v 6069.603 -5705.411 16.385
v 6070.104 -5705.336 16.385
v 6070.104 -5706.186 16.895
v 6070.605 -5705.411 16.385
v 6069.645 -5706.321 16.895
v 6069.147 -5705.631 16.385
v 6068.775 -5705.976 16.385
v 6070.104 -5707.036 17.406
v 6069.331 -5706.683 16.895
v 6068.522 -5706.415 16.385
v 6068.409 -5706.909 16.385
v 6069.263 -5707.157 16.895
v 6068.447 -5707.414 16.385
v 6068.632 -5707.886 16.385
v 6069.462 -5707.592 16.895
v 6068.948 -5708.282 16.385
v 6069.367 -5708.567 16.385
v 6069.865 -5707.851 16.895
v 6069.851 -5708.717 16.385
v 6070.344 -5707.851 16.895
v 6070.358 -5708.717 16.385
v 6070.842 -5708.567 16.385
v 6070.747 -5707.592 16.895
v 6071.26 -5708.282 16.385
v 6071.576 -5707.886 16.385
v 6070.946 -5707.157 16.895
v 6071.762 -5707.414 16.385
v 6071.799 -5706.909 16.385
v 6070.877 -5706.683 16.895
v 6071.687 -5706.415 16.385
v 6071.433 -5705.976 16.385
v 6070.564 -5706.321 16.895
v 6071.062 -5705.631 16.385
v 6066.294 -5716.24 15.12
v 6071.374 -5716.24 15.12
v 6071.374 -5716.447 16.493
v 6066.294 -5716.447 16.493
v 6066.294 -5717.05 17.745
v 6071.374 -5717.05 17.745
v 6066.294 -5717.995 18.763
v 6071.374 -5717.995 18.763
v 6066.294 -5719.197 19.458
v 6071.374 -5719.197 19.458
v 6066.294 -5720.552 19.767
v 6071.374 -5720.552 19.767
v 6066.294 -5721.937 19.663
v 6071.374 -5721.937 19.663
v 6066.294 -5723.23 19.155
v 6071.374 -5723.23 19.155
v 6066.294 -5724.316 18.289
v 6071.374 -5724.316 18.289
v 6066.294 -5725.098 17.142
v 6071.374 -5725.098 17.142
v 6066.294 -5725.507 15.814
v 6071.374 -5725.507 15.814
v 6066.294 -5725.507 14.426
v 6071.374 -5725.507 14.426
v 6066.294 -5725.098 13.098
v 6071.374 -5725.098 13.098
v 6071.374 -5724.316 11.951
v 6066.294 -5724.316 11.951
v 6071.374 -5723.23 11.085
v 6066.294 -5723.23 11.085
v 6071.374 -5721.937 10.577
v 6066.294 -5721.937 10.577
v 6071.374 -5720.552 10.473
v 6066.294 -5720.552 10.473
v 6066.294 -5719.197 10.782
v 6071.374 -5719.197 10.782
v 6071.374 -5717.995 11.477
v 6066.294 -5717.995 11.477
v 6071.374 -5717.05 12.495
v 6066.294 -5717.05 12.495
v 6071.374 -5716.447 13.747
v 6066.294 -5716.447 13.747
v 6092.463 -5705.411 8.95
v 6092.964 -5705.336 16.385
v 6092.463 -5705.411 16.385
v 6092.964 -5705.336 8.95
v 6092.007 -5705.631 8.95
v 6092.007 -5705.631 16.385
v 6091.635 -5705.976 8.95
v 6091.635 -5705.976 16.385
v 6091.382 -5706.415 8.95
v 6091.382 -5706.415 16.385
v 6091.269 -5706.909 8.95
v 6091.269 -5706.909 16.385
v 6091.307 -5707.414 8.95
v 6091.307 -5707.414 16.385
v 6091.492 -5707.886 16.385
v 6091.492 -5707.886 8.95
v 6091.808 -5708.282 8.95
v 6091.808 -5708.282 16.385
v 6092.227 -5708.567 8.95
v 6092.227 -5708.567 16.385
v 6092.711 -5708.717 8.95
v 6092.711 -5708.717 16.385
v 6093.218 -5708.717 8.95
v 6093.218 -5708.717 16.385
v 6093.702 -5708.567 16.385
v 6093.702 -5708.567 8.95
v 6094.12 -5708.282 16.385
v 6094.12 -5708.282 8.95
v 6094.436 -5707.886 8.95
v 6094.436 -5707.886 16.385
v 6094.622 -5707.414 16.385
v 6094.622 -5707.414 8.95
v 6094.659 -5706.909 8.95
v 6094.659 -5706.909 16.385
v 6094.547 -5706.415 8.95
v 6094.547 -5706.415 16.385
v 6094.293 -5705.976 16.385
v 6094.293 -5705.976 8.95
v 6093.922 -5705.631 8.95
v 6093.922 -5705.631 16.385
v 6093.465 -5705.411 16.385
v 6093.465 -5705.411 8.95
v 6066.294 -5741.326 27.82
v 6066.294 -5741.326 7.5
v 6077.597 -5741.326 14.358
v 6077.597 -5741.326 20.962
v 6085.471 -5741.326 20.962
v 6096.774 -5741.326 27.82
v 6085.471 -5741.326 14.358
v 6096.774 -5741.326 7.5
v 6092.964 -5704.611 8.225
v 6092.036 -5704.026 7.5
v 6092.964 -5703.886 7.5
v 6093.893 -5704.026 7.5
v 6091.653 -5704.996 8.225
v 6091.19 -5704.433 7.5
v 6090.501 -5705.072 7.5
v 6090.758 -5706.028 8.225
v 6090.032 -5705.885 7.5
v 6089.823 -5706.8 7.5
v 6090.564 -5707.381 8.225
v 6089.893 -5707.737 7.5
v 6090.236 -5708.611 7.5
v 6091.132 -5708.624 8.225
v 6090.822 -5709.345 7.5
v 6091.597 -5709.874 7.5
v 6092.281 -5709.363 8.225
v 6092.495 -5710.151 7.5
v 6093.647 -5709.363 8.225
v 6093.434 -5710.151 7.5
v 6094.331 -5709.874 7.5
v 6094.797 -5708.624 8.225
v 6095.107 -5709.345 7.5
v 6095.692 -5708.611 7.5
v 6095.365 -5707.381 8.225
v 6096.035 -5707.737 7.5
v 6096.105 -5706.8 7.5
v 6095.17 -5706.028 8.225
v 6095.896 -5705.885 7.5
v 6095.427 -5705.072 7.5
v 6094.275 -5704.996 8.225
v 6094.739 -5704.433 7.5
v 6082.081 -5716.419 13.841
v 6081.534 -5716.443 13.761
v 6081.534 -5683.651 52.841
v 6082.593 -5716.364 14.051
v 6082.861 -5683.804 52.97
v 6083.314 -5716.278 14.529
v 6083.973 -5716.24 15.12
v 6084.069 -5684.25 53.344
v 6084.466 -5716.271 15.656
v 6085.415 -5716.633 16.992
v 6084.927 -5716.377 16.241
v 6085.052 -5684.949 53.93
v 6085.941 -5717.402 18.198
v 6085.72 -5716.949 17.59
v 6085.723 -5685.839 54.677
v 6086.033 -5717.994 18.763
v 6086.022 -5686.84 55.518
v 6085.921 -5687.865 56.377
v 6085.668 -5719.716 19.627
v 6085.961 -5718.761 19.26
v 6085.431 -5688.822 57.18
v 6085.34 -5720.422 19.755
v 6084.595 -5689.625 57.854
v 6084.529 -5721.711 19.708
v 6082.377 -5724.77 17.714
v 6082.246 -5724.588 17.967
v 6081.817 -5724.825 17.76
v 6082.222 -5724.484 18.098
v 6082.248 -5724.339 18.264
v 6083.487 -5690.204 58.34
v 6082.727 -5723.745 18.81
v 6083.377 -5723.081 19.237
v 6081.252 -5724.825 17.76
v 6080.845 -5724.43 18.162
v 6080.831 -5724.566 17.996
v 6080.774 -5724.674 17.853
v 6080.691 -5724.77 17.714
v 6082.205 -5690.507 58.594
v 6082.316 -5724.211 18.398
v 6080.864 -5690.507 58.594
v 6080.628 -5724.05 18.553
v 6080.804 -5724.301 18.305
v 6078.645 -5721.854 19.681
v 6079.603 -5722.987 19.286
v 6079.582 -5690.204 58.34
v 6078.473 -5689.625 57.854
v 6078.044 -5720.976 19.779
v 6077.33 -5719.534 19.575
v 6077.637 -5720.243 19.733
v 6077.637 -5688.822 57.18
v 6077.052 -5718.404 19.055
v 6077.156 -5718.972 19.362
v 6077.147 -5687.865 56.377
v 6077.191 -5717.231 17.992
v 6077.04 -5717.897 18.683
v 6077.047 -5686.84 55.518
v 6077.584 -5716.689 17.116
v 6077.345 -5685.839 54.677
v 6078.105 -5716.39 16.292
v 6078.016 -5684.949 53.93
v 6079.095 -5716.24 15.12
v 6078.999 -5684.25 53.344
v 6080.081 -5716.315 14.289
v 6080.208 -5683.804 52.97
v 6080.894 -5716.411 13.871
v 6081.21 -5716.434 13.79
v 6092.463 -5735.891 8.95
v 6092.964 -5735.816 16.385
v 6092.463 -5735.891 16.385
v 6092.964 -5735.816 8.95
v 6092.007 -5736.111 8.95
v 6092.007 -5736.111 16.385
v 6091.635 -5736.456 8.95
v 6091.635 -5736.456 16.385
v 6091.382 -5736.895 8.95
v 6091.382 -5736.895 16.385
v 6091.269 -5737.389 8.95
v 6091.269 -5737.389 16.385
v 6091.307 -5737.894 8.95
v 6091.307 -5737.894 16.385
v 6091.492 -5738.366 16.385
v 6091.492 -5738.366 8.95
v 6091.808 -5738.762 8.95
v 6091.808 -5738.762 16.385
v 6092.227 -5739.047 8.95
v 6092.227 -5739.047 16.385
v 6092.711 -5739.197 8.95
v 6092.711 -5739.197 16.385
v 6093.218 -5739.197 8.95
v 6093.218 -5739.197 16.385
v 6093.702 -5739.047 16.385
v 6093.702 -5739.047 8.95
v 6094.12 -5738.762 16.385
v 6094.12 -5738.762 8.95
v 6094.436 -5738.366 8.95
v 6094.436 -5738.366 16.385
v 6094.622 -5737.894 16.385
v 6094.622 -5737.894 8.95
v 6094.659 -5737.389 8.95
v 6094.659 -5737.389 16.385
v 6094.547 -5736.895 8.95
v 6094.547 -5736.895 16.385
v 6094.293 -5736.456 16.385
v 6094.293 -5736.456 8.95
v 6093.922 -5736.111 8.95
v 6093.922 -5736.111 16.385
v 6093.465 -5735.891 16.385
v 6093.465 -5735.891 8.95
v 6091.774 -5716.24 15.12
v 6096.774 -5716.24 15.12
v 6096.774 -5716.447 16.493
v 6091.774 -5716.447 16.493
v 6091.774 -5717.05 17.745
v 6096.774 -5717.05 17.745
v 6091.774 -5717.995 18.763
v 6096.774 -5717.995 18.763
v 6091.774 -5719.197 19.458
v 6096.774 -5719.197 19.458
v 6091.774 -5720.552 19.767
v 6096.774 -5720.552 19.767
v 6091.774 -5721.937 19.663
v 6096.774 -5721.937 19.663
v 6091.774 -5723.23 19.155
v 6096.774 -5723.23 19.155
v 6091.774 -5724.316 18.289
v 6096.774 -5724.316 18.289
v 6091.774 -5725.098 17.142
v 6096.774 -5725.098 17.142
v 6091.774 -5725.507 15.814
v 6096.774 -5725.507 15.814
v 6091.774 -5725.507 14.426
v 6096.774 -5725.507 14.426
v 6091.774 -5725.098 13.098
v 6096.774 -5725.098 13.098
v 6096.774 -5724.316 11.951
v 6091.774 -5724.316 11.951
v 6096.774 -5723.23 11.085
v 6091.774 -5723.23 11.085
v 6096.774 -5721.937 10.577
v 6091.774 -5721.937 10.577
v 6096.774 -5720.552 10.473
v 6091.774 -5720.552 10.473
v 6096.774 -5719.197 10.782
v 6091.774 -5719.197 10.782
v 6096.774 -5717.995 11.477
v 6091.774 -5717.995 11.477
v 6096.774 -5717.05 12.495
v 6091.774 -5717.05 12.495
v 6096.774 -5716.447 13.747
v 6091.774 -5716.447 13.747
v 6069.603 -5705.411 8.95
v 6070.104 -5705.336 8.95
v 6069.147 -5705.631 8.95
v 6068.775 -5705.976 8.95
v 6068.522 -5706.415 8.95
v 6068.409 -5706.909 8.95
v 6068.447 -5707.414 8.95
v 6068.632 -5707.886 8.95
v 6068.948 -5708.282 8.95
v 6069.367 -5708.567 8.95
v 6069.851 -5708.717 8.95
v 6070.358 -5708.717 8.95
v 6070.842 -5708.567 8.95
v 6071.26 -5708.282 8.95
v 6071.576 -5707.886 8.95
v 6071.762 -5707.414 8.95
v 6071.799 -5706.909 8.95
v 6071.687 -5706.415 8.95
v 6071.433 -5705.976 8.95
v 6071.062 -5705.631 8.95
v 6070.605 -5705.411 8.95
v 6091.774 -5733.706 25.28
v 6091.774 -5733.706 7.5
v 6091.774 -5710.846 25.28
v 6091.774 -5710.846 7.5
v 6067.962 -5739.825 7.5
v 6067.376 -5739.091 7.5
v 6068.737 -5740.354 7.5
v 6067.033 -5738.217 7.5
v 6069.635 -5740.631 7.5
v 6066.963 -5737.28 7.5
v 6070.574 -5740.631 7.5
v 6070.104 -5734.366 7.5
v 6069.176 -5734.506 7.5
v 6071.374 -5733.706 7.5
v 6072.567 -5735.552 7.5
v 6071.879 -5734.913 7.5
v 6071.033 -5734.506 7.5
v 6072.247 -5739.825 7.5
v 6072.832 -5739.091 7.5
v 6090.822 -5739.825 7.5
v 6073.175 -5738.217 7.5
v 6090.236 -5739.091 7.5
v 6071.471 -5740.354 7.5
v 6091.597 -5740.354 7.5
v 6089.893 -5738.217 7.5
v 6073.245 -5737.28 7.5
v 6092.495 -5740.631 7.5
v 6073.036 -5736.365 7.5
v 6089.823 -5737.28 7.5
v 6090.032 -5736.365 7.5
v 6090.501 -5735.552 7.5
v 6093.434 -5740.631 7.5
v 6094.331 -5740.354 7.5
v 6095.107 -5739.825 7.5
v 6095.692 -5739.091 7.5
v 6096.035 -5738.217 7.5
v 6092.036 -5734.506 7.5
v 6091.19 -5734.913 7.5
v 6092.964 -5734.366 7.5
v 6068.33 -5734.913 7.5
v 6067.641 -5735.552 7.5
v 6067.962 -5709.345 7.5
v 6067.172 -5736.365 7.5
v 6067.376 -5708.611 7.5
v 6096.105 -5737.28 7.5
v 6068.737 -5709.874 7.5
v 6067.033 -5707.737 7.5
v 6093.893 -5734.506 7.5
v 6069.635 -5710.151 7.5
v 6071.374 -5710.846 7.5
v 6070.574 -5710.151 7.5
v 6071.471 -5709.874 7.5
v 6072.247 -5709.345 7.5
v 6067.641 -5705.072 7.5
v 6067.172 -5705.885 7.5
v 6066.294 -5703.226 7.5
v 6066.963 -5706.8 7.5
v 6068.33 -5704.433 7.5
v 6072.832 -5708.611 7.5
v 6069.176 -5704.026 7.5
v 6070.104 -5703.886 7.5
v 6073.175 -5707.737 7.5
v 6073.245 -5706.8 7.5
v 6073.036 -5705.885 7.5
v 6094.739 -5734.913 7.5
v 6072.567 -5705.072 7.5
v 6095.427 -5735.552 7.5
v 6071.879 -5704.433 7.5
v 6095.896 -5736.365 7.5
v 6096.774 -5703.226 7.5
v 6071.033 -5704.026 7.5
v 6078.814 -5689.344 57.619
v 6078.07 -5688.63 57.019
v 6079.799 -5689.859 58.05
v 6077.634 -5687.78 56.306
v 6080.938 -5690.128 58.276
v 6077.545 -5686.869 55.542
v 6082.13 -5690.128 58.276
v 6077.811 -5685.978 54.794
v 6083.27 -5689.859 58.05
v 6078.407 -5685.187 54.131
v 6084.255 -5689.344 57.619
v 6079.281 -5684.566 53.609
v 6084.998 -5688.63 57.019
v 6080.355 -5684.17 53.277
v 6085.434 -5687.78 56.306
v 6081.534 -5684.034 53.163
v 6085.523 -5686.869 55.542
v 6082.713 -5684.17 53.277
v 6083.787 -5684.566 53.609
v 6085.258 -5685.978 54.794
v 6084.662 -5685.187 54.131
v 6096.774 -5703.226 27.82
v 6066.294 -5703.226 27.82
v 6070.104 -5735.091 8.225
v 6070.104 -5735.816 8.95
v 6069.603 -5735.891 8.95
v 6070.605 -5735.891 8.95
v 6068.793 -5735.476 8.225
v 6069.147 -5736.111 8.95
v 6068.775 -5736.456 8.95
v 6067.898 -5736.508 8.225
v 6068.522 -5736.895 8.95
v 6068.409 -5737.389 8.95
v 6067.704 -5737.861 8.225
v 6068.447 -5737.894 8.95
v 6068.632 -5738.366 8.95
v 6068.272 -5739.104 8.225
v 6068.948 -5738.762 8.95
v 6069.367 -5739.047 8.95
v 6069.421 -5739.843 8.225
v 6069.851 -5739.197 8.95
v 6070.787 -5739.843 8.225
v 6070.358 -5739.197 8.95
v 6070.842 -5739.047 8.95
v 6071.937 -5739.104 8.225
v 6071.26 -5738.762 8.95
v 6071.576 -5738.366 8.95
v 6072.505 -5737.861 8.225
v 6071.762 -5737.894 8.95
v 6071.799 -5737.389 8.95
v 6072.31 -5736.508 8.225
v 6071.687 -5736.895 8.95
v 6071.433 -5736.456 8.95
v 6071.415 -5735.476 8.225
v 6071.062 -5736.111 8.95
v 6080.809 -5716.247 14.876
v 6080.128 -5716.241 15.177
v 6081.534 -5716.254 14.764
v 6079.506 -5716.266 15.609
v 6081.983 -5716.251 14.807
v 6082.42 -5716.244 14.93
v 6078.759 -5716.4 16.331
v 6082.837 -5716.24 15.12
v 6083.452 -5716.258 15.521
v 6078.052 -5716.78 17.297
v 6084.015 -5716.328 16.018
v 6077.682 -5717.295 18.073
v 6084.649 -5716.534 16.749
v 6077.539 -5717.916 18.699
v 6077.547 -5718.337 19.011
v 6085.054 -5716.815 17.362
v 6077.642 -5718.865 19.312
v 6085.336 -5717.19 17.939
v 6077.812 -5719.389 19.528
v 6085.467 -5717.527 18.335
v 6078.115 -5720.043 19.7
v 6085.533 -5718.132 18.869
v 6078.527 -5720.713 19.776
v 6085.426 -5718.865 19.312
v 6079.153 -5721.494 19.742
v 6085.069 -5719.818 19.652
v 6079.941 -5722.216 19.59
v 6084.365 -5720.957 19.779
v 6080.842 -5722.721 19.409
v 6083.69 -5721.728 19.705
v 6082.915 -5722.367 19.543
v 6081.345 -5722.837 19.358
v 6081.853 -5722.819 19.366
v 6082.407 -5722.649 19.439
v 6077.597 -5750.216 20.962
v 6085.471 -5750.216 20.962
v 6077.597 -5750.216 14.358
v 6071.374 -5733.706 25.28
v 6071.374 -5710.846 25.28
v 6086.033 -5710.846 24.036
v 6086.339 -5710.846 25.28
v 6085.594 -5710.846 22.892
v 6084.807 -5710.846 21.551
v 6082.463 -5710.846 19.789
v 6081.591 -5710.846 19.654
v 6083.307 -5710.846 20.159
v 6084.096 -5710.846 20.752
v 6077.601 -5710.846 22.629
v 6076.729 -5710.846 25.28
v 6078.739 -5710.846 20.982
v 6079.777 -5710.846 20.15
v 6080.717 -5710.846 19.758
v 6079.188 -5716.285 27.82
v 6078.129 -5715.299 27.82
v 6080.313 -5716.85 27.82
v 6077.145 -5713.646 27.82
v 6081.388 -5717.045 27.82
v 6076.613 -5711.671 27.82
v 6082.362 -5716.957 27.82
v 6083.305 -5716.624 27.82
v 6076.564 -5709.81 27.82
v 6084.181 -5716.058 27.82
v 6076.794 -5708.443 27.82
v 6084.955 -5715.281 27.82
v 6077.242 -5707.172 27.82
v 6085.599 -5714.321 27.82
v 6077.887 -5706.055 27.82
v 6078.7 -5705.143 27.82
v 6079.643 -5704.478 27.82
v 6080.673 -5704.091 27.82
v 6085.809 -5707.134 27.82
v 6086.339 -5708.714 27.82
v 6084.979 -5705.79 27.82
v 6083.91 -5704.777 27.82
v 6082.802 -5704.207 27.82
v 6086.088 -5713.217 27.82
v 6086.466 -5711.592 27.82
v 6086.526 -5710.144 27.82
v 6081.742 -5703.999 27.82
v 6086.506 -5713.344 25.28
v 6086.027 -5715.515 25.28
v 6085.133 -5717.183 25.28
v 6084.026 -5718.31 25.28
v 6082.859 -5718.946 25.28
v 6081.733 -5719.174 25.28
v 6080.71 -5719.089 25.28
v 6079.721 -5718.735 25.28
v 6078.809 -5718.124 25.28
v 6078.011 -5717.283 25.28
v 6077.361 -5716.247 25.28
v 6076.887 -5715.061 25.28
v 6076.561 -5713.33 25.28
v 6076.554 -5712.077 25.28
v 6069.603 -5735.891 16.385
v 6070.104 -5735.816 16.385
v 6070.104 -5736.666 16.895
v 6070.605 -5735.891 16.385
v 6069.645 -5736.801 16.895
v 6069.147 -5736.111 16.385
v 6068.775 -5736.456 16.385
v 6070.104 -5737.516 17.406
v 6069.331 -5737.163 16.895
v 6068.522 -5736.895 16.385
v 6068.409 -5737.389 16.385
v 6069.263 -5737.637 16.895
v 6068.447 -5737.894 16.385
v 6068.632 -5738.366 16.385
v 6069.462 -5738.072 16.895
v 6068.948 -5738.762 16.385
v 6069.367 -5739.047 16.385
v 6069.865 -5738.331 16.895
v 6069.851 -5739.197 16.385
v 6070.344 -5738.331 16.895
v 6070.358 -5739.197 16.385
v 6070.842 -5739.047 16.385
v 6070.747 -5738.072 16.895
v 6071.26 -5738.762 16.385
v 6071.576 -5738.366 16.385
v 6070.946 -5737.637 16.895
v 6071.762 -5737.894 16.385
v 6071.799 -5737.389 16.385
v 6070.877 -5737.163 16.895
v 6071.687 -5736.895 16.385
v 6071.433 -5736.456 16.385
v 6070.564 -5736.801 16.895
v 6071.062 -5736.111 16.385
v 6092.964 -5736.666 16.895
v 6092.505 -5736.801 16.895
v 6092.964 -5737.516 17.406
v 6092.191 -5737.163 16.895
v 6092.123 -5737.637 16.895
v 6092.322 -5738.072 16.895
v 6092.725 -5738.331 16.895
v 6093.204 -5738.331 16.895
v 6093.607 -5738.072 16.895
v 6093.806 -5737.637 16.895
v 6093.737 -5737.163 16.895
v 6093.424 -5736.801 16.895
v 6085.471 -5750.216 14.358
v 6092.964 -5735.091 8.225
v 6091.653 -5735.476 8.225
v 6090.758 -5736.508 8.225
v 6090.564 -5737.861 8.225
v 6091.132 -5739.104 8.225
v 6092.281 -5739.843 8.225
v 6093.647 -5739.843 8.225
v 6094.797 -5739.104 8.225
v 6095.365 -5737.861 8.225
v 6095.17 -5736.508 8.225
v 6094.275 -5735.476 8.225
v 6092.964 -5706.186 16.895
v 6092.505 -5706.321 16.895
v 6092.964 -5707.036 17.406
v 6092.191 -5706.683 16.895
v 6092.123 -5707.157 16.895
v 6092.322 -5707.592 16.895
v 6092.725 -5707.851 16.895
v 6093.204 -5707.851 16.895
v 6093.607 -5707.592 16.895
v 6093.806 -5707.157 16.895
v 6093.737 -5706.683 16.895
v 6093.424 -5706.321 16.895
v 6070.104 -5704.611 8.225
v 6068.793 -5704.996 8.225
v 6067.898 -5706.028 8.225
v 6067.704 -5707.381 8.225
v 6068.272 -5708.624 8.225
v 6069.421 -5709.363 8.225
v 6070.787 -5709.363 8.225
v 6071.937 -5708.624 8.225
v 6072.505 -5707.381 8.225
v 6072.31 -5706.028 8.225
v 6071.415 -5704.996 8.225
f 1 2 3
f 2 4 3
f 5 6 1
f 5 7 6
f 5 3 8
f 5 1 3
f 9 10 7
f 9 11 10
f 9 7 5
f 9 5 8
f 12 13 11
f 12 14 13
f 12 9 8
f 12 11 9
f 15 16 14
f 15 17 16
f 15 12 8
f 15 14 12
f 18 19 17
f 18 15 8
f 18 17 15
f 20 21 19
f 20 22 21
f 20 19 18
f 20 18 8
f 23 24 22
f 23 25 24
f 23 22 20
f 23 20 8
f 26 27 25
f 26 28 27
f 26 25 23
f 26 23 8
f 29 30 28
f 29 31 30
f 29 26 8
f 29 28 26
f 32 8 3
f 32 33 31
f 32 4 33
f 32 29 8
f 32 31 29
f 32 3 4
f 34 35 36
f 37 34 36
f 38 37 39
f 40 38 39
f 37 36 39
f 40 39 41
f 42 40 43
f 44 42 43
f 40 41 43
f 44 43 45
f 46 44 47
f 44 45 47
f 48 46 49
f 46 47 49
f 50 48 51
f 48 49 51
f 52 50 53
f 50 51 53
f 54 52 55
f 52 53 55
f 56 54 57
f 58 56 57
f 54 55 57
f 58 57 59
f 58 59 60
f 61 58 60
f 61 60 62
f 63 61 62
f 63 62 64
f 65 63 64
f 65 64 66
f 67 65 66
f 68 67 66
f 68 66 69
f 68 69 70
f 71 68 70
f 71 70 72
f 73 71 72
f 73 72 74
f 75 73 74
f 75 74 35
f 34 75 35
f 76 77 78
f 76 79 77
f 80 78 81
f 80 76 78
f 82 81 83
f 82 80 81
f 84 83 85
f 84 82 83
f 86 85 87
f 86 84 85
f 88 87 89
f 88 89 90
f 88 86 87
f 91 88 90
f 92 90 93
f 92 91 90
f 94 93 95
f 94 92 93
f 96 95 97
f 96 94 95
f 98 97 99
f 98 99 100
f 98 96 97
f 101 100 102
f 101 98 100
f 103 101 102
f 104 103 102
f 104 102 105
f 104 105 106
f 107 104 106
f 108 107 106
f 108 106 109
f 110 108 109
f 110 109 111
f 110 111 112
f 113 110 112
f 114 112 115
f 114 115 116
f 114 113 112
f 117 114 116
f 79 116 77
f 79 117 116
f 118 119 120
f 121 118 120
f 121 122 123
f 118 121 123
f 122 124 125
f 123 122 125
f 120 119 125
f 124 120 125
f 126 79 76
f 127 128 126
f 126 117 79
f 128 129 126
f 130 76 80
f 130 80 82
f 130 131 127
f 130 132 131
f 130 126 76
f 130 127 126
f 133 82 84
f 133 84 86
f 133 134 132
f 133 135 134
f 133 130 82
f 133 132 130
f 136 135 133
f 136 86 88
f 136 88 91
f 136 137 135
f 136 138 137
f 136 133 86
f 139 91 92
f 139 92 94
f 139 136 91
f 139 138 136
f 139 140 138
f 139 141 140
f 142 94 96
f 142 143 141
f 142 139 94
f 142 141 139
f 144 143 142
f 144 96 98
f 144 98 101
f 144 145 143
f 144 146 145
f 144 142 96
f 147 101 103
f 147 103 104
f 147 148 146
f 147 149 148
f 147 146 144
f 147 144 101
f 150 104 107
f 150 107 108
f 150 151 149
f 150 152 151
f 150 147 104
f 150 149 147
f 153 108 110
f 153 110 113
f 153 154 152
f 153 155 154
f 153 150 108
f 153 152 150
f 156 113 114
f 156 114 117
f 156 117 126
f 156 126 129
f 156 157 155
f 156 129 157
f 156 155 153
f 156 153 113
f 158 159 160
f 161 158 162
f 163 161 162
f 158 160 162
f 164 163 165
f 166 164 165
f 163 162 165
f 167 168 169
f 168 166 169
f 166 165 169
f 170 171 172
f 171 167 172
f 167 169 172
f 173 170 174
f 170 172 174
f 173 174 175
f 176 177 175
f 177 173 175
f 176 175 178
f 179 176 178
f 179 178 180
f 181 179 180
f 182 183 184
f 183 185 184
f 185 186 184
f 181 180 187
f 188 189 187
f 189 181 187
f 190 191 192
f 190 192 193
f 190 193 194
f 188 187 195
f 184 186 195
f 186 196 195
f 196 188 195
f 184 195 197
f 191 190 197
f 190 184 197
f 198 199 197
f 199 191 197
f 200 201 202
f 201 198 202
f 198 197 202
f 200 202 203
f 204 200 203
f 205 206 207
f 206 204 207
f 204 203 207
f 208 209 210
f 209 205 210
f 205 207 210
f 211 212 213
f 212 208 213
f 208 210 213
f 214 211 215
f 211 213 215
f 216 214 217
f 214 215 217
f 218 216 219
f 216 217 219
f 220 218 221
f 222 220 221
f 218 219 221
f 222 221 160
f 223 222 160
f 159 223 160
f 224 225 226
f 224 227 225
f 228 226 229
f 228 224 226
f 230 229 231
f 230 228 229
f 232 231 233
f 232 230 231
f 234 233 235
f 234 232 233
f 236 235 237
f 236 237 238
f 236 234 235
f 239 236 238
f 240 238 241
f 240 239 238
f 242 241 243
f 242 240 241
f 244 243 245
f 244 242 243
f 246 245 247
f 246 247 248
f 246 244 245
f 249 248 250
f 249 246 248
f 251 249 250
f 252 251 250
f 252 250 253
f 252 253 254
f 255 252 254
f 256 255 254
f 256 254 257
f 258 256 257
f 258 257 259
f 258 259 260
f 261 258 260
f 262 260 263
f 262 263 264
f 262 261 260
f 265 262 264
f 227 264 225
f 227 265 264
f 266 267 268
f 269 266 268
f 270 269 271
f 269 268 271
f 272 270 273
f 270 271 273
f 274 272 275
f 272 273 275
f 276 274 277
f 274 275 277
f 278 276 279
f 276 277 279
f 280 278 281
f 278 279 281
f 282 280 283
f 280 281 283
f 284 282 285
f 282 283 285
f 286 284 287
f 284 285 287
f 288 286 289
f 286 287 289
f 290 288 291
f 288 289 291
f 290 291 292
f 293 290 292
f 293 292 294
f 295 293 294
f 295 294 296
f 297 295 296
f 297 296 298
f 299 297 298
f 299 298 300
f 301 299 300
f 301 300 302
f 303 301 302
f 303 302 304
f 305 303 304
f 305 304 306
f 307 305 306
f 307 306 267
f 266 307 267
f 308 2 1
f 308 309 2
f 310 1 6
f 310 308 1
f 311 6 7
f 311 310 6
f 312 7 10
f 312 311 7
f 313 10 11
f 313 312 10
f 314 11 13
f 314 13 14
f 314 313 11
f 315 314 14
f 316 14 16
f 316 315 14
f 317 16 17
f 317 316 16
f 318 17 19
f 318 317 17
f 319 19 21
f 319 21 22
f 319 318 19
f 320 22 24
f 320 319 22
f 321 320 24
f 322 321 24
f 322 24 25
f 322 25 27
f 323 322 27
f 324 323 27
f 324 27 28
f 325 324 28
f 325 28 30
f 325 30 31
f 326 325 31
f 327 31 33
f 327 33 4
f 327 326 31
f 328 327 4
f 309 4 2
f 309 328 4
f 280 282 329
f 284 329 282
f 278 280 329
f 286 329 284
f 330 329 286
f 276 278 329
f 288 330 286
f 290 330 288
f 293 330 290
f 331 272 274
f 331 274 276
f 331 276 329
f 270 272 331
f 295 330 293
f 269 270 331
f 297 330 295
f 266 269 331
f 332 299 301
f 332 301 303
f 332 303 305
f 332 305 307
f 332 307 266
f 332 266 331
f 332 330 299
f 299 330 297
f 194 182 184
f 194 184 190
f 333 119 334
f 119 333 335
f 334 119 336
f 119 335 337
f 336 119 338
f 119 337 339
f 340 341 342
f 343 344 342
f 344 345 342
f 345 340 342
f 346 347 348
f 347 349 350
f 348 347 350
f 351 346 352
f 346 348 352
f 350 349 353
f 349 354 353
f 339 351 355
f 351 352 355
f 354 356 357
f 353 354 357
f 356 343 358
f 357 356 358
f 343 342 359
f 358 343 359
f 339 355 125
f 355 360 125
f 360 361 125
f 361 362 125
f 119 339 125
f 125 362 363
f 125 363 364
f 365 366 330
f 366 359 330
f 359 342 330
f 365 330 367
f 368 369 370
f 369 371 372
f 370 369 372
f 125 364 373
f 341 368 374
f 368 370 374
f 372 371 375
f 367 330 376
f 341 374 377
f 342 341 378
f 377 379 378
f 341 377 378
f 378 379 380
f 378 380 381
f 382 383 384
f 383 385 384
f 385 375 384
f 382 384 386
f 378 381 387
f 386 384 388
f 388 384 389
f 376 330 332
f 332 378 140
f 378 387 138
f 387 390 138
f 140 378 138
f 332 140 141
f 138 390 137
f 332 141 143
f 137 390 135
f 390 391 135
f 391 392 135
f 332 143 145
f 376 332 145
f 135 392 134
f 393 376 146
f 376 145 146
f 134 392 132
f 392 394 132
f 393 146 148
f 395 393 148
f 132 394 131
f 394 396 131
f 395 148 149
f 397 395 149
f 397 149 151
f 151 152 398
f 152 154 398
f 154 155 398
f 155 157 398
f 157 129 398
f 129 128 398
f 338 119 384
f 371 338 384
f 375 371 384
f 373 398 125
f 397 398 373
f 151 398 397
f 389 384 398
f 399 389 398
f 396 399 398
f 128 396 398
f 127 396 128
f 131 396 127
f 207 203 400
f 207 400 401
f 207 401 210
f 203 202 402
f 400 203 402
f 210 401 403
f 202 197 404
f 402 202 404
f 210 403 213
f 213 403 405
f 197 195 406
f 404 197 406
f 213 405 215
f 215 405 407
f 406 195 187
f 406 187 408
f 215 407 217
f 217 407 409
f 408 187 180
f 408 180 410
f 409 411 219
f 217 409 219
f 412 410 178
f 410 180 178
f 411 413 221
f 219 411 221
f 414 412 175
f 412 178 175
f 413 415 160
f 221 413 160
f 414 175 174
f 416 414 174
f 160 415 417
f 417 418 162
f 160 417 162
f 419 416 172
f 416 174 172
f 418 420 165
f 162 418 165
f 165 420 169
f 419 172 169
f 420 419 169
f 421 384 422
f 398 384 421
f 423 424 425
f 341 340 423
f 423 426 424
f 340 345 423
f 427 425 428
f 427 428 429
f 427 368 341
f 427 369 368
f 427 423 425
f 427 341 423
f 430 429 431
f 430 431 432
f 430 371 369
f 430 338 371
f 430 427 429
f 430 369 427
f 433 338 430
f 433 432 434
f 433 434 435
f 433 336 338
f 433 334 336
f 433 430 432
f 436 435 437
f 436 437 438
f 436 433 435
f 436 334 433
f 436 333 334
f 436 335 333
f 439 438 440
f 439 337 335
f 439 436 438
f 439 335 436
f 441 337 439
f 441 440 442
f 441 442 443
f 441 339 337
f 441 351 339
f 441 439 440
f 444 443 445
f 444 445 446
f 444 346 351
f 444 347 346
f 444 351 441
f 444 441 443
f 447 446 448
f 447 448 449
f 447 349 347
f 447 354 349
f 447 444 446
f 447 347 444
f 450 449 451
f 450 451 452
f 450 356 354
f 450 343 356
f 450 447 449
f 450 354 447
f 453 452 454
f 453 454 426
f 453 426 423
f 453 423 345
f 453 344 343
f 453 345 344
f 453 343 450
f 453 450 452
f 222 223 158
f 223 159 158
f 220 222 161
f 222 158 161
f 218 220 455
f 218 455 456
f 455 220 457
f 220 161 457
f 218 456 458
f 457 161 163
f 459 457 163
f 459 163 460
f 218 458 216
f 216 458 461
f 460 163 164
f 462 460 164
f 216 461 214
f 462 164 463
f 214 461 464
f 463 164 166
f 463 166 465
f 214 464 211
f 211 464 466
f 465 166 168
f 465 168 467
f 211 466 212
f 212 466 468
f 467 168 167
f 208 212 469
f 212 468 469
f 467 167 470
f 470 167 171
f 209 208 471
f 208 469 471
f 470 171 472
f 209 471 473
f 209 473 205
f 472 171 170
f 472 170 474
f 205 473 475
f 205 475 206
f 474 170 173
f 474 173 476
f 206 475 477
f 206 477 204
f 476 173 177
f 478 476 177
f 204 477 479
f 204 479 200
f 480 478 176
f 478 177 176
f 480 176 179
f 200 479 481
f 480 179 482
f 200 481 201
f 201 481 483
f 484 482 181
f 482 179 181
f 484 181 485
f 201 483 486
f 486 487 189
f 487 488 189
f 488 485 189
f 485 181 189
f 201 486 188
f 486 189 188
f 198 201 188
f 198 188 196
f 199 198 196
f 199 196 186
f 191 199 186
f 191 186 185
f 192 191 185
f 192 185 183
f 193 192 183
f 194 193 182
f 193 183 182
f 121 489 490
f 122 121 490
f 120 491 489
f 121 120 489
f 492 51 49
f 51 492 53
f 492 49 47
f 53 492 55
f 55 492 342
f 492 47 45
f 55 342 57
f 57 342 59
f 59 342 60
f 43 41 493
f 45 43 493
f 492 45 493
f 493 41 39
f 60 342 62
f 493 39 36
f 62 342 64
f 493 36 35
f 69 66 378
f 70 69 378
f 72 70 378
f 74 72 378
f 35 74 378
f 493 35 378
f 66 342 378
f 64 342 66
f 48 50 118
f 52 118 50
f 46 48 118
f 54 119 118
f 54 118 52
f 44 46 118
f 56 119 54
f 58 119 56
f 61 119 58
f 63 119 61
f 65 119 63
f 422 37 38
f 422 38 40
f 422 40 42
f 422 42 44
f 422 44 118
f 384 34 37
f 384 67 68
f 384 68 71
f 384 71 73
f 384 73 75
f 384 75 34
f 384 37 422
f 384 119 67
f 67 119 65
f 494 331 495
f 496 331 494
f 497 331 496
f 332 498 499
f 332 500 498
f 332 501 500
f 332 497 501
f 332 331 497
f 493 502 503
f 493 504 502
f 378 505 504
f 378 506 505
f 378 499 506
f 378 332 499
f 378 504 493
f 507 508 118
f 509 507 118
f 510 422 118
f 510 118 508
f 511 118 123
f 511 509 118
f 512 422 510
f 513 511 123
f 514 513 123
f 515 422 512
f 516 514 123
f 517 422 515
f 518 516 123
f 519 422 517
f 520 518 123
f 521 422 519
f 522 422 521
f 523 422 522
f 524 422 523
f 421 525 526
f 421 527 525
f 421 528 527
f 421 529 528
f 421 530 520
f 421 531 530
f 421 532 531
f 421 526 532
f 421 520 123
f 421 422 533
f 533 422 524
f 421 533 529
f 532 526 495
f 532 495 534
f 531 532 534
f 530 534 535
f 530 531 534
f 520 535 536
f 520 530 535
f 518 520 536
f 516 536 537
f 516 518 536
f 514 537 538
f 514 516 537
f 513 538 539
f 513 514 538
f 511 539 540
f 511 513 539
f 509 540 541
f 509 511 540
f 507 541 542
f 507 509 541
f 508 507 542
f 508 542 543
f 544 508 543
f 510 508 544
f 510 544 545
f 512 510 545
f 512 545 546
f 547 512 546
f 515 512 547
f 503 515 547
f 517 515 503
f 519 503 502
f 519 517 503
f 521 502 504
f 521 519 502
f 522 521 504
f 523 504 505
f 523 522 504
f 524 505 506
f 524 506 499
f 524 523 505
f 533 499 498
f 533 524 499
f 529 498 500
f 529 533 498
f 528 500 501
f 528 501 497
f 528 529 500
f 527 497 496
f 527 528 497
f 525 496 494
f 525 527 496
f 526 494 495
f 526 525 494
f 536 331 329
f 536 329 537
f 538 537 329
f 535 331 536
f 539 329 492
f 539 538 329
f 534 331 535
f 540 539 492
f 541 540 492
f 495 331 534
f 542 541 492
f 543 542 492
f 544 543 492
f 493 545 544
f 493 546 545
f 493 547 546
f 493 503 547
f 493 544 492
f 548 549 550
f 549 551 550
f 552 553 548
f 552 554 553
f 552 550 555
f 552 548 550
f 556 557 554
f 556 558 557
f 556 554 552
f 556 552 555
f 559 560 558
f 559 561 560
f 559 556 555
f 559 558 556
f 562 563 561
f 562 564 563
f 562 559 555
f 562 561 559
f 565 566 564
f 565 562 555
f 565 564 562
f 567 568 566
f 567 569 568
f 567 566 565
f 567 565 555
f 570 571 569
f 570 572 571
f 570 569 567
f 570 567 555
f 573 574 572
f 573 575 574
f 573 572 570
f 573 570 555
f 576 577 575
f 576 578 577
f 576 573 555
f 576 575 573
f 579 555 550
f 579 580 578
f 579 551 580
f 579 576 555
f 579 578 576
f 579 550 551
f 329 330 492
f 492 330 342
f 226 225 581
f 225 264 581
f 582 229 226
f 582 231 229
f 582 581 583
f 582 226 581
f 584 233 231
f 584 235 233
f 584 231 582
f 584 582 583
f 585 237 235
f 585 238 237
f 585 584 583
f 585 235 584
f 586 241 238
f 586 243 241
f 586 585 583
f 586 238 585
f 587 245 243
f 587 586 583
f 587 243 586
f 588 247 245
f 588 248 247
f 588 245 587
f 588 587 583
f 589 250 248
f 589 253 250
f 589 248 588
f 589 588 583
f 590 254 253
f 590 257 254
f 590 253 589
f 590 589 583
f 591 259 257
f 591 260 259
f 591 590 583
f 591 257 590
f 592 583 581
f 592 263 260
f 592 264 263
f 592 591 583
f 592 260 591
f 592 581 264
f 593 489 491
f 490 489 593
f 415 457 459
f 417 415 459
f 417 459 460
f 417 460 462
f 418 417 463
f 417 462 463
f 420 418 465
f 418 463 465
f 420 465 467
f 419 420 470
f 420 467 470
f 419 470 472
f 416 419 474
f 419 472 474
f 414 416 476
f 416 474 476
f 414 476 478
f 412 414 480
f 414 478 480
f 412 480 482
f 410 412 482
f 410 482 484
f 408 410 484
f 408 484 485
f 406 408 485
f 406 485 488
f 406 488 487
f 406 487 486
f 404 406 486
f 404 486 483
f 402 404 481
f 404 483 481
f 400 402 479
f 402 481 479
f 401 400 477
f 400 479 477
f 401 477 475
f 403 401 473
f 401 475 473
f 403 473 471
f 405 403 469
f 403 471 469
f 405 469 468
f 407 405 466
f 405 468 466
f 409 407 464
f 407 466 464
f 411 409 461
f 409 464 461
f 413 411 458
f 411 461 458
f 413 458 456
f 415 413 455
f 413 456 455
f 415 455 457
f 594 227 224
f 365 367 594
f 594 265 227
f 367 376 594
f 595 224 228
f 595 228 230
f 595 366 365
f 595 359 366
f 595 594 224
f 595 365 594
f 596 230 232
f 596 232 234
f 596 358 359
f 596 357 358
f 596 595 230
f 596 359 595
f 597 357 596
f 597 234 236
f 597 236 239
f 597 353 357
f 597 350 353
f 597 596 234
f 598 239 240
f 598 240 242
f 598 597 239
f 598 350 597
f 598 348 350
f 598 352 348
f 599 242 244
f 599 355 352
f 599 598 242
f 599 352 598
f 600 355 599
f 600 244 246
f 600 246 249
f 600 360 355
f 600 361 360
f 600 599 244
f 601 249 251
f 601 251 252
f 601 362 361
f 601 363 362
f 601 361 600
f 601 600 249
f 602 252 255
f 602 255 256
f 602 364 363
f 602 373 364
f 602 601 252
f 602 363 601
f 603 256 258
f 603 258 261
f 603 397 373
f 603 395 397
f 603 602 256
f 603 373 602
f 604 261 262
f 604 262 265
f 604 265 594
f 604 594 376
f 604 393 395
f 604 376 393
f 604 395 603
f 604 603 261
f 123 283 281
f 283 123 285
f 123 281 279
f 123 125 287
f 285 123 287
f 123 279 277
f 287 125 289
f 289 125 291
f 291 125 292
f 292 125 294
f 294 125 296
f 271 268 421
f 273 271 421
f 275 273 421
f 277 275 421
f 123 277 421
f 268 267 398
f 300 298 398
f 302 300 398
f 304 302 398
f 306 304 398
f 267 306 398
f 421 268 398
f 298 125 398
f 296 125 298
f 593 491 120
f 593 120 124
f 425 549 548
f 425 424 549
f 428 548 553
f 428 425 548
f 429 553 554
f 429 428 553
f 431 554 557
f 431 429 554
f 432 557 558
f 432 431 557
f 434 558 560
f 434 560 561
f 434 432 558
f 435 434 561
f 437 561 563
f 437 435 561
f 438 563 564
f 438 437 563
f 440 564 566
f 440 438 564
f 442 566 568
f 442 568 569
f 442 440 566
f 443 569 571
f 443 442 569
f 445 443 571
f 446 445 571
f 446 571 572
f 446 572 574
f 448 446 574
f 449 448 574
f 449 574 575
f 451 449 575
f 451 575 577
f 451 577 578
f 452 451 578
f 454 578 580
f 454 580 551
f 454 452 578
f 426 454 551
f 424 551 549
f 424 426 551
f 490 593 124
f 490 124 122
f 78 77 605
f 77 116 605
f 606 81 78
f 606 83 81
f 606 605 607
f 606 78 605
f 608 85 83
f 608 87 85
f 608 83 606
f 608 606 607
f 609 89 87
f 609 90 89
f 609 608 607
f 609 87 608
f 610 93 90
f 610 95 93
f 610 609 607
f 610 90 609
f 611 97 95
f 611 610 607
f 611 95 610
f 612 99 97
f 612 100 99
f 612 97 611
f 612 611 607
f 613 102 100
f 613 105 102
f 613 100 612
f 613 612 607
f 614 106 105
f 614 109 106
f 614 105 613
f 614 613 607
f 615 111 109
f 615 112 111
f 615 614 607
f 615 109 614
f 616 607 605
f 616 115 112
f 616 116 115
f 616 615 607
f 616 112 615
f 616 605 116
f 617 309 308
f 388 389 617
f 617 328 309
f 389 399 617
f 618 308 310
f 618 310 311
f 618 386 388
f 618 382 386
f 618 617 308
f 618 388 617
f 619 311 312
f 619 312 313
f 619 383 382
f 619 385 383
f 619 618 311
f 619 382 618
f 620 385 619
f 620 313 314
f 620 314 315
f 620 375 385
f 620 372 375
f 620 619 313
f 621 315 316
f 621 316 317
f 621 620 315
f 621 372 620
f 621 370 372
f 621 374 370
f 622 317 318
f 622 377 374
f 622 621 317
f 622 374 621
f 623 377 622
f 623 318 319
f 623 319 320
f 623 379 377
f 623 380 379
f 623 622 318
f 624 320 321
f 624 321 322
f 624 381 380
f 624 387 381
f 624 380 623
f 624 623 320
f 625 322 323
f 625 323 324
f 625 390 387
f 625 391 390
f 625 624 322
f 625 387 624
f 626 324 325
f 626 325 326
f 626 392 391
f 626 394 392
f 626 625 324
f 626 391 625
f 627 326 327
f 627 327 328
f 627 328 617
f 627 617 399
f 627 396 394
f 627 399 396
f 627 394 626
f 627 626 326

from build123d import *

# Parameters (mm, degrees)
BOSS_EXTRUDE1_START                            = 7.5
SKETCH1_W                                      = 30.48
SKETCH1_H                                      = 38.1
BOSS_EXTRUDE1_DEPTH                            = 20.32
SKETCH2_W                                      = 20.4
SKETCH2_H                                      = 22.86
CUT_EXTRUDE1_DEPTH                             = 17.78
SKETCH5_R                                      = 5
CUT_EXTRUDE2_DEPTH                             = 23
BOSS_EXTRUDE2_DEPTH                            = 21.59
BOSS_EXTRUDE2_DEPTH_BACK                       = 31.75
SKETCH10_R                                     = 4.5
SKETCH11_R                                     = 4
CUT_EXTRUDE6_DEPTH                             = 7540.718926849
CSK_FOR_M3_FLAT_HEAD_MACHINE_SCREW1_AT_2_COUNT = 2
CSK_FOR_M3_FLAT_HEAD_MACHINE_SCREW1_AT_2_PITCH = 22.86
CSK_FOR_M3_FLAT_HEAD_MACHINE_SCREW1_AT_3_COUNT = 2
CSK_FOR_M3_FLAT_HEAD_MACHINE_SCREW1_AT_3_PITCH = 38.1
CSK_FOR_M3_FLAT_HEAD_MACHINE_SCREW1_AT_4_COUNT = 2
CSK_FOR_M3_FLAT_HEAD_MACHINE_SCREW1_AT_4_PITCH = 30.48
SKETCH17_R                                     = 4.659600795
CUT_EXTRUDE7_DEPTH                             = 5742.70602656
SKETCH19_W                                     = 7.874
SKETCH19_H                                     = 6.604
BOSS_EXTRUDE3_DEPTH                            = 8.89


with BuildPart() as part:
    # Sketch1 → Boss-Extrude1 (new body)
    with BuildSketch(Plane.XY.offset(BOSS_EXTRUDE1_START)):
        with Locations((6081.534193548, -5722.275806452)):
            Rectangle(SKETCH1_W, SKETCH1_H)
    extrude(amount=BOSS_EXTRUDE1_DEPTH)

    # Sketch2 → Cut-Extrude1 (cut)
    with BuildSketch(Plane(origin=(0, 0, 7.5), x_dir=(-1, 0, 0), z_dir=(0, 0, -1))):
        with Locations((-6081.574193548, -5722.275806452)):
            Rectangle(SKETCH2_W, SKETCH2_H)
    extrude(amount=-CUT_EXTRUDE1_DEPTH, mode=Mode.SUBTRACT)

    # Sketch5 → Cut-Extrude2 (cut)
    with BuildSketch(Plane(origin=(0, -2342.736843325, -2791.965049535), x_dir=(-1, 0, 0), z_dir=(0, -0.6427876096865405, -0.766044443118977))):
        with Locations(Location((-6081.534193548, -4392.394788186, 0), (0, 0, 163.93758294))):
            Circle(SKETCH5_R)
    extrude(amount=CUT_EXTRUDE2_DEPTH, mode=Mode.SUBTRACT)

    # Sketch14 → CSK for M3 Flat Head Machine Screw1 (revolve, cut)
    with BuildSketch(Plane(origin=(6092.964193548, -5707.035806452, 7.5), x_dir=(0, 1, 0), z_dir=(1, 0, 0))):
        Polygon((0, 0), (0, 9.906), (1.7, 8.884536948), (1.7, 1.45), (3.15, 0), align=None)
    csk_for_m3_flat_head_machine_screw1 = revolve(axis=Axis((6092.964193548, -5707.035806452, 1.15), (0, 0, 1)), mode=Mode.SUBTRACT)

    # CSK for M3 Flat Head Machine Screw1 at 2: CSK for M3 Flat Head Machine Screw1 ×2
    with Locations(*[(-i * CSK_FOR_M3_FLAT_HEAD_MACHINE_SCREW1_AT_2_PITCH, 0, 0) for i in range(1, CSK_FOR_M3_FLAT_HEAD_MACHINE_SCREW1_AT_2_COUNT)]):
        add(csk_for_m3_flat_head_machine_screw1, mode=Mode.SUBTRACT)

    # CSK for M3 Flat Head Machine Screw1 at 3: CSK for M3 Flat Head Machine Screw1 ×2
    with Locations(*[Vector(-0.5999999999999771, -0.8000000000000171, 0) * (i * CSK_FOR_M3_FLAT_HEAD_MACHINE_SCREW1_AT_3_PITCH) for i in range(1, CSK_FOR_M3_FLAT_HEAD_MACHINE_SCREW1_AT_3_COUNT)]):
        add(csk_for_m3_flat_head_machine_screw1, mode=Mode.SUBTRACT)

    # CSK for M3 Flat Head Machine Screw1 at 4: CSK for M3 Flat Head Machine Screw1 ×2
    with Locations(*[(0, -i * CSK_FOR_M3_FLAT_HEAD_MACHINE_SCREW1_AT_4_PITCH, 0) for i in range(1, CSK_FOR_M3_FLAT_HEAD_MACHINE_SCREW1_AT_4_COUNT)]):
        add(csk_for_m3_flat_head_machine_screw1, mode=Mode.SUBTRACT)


with BuildPart() as body_2:
    # Sketch10 → Boss-Extrude2 (new, two sides: drawn at the far end of the back side and taken through both)
    with BuildSketch(Plane(origin=(0, -2342.736843325, -2791.965049535), x_dir=(-1, 0, 0), z_dir=(0, -0.6427876096865405, -0.766044443118977)).offset(-BOSS_EXTRUDE2_DEPTH_BACK)):
        with Locations(Location((-6081.534193548, -4392.394788186, 0), (0, 0, 90))):
            Circle(SKETCH10_R)
    extrude(amount=BOSS_EXTRUDE2_DEPTH + BOSS_EXTRUDE2_DEPTH_BACK)

    # Sketch11 → Cut-Extrude6 (cut, through all)
    with BuildSketch(Plane(origin=(0, -2356.614627818, -2808.503949062), x_dir=(1, 0, 0), z_dir=(0, -0.6427876096865406, -0.766044443118977))):
        with Locations(Location((6081.534193548, 4392.394788186, 0), (0, 0, 270))):
            Circle(SKETCH11_R)
    extrude(amount=-CUT_EXTRUDE6_DEPTH, mode=Mode.SUBTRACT)


with BuildPart() as cut_extrude7_tool:
    # Sketch17 → Cut-Extrude7 (new, through all)
    with BuildSketch(Plane(origin=(6096.774193549, 0, 0), x_dir=(0, 0, -1), z_dir=(1, 0, 0))):
        with Locations(Location((-15.12, -5720.899791669, 0), (0, 0, 90))):
            Circle(SKETCH17_R)
    extrude(amount=-CUT_EXTRUDE7_DEPTH)


with BuildPart() as part_1:
    add(part.part)

    # Cut-Extrude7: cut by cut_extrude7_tool
    add(cut_extrude7_tool.part, mode=Mode.SUBTRACT)

    # Sketch19 → Boss-Extrude3 (add)
    with BuildSketch(Plane.XZ.offset(5741.325806452)):
        with Locations((6081.534193548, 17.66)):
            Rectangle(SKETCH19_W, SKETCH19_H)
    extrude(amount=BOSS_EXTRUDE3_DEPTH)


with BuildPart() as body_2_1:
    add(body_2.part)

    # Cut-Extrude7: cut by cut_extrude7_tool
    add(cut_extrude7_tool.part, mode=Mode.SUBTRACT)


solid = Compound([part_1.part, body_2_1.part])
